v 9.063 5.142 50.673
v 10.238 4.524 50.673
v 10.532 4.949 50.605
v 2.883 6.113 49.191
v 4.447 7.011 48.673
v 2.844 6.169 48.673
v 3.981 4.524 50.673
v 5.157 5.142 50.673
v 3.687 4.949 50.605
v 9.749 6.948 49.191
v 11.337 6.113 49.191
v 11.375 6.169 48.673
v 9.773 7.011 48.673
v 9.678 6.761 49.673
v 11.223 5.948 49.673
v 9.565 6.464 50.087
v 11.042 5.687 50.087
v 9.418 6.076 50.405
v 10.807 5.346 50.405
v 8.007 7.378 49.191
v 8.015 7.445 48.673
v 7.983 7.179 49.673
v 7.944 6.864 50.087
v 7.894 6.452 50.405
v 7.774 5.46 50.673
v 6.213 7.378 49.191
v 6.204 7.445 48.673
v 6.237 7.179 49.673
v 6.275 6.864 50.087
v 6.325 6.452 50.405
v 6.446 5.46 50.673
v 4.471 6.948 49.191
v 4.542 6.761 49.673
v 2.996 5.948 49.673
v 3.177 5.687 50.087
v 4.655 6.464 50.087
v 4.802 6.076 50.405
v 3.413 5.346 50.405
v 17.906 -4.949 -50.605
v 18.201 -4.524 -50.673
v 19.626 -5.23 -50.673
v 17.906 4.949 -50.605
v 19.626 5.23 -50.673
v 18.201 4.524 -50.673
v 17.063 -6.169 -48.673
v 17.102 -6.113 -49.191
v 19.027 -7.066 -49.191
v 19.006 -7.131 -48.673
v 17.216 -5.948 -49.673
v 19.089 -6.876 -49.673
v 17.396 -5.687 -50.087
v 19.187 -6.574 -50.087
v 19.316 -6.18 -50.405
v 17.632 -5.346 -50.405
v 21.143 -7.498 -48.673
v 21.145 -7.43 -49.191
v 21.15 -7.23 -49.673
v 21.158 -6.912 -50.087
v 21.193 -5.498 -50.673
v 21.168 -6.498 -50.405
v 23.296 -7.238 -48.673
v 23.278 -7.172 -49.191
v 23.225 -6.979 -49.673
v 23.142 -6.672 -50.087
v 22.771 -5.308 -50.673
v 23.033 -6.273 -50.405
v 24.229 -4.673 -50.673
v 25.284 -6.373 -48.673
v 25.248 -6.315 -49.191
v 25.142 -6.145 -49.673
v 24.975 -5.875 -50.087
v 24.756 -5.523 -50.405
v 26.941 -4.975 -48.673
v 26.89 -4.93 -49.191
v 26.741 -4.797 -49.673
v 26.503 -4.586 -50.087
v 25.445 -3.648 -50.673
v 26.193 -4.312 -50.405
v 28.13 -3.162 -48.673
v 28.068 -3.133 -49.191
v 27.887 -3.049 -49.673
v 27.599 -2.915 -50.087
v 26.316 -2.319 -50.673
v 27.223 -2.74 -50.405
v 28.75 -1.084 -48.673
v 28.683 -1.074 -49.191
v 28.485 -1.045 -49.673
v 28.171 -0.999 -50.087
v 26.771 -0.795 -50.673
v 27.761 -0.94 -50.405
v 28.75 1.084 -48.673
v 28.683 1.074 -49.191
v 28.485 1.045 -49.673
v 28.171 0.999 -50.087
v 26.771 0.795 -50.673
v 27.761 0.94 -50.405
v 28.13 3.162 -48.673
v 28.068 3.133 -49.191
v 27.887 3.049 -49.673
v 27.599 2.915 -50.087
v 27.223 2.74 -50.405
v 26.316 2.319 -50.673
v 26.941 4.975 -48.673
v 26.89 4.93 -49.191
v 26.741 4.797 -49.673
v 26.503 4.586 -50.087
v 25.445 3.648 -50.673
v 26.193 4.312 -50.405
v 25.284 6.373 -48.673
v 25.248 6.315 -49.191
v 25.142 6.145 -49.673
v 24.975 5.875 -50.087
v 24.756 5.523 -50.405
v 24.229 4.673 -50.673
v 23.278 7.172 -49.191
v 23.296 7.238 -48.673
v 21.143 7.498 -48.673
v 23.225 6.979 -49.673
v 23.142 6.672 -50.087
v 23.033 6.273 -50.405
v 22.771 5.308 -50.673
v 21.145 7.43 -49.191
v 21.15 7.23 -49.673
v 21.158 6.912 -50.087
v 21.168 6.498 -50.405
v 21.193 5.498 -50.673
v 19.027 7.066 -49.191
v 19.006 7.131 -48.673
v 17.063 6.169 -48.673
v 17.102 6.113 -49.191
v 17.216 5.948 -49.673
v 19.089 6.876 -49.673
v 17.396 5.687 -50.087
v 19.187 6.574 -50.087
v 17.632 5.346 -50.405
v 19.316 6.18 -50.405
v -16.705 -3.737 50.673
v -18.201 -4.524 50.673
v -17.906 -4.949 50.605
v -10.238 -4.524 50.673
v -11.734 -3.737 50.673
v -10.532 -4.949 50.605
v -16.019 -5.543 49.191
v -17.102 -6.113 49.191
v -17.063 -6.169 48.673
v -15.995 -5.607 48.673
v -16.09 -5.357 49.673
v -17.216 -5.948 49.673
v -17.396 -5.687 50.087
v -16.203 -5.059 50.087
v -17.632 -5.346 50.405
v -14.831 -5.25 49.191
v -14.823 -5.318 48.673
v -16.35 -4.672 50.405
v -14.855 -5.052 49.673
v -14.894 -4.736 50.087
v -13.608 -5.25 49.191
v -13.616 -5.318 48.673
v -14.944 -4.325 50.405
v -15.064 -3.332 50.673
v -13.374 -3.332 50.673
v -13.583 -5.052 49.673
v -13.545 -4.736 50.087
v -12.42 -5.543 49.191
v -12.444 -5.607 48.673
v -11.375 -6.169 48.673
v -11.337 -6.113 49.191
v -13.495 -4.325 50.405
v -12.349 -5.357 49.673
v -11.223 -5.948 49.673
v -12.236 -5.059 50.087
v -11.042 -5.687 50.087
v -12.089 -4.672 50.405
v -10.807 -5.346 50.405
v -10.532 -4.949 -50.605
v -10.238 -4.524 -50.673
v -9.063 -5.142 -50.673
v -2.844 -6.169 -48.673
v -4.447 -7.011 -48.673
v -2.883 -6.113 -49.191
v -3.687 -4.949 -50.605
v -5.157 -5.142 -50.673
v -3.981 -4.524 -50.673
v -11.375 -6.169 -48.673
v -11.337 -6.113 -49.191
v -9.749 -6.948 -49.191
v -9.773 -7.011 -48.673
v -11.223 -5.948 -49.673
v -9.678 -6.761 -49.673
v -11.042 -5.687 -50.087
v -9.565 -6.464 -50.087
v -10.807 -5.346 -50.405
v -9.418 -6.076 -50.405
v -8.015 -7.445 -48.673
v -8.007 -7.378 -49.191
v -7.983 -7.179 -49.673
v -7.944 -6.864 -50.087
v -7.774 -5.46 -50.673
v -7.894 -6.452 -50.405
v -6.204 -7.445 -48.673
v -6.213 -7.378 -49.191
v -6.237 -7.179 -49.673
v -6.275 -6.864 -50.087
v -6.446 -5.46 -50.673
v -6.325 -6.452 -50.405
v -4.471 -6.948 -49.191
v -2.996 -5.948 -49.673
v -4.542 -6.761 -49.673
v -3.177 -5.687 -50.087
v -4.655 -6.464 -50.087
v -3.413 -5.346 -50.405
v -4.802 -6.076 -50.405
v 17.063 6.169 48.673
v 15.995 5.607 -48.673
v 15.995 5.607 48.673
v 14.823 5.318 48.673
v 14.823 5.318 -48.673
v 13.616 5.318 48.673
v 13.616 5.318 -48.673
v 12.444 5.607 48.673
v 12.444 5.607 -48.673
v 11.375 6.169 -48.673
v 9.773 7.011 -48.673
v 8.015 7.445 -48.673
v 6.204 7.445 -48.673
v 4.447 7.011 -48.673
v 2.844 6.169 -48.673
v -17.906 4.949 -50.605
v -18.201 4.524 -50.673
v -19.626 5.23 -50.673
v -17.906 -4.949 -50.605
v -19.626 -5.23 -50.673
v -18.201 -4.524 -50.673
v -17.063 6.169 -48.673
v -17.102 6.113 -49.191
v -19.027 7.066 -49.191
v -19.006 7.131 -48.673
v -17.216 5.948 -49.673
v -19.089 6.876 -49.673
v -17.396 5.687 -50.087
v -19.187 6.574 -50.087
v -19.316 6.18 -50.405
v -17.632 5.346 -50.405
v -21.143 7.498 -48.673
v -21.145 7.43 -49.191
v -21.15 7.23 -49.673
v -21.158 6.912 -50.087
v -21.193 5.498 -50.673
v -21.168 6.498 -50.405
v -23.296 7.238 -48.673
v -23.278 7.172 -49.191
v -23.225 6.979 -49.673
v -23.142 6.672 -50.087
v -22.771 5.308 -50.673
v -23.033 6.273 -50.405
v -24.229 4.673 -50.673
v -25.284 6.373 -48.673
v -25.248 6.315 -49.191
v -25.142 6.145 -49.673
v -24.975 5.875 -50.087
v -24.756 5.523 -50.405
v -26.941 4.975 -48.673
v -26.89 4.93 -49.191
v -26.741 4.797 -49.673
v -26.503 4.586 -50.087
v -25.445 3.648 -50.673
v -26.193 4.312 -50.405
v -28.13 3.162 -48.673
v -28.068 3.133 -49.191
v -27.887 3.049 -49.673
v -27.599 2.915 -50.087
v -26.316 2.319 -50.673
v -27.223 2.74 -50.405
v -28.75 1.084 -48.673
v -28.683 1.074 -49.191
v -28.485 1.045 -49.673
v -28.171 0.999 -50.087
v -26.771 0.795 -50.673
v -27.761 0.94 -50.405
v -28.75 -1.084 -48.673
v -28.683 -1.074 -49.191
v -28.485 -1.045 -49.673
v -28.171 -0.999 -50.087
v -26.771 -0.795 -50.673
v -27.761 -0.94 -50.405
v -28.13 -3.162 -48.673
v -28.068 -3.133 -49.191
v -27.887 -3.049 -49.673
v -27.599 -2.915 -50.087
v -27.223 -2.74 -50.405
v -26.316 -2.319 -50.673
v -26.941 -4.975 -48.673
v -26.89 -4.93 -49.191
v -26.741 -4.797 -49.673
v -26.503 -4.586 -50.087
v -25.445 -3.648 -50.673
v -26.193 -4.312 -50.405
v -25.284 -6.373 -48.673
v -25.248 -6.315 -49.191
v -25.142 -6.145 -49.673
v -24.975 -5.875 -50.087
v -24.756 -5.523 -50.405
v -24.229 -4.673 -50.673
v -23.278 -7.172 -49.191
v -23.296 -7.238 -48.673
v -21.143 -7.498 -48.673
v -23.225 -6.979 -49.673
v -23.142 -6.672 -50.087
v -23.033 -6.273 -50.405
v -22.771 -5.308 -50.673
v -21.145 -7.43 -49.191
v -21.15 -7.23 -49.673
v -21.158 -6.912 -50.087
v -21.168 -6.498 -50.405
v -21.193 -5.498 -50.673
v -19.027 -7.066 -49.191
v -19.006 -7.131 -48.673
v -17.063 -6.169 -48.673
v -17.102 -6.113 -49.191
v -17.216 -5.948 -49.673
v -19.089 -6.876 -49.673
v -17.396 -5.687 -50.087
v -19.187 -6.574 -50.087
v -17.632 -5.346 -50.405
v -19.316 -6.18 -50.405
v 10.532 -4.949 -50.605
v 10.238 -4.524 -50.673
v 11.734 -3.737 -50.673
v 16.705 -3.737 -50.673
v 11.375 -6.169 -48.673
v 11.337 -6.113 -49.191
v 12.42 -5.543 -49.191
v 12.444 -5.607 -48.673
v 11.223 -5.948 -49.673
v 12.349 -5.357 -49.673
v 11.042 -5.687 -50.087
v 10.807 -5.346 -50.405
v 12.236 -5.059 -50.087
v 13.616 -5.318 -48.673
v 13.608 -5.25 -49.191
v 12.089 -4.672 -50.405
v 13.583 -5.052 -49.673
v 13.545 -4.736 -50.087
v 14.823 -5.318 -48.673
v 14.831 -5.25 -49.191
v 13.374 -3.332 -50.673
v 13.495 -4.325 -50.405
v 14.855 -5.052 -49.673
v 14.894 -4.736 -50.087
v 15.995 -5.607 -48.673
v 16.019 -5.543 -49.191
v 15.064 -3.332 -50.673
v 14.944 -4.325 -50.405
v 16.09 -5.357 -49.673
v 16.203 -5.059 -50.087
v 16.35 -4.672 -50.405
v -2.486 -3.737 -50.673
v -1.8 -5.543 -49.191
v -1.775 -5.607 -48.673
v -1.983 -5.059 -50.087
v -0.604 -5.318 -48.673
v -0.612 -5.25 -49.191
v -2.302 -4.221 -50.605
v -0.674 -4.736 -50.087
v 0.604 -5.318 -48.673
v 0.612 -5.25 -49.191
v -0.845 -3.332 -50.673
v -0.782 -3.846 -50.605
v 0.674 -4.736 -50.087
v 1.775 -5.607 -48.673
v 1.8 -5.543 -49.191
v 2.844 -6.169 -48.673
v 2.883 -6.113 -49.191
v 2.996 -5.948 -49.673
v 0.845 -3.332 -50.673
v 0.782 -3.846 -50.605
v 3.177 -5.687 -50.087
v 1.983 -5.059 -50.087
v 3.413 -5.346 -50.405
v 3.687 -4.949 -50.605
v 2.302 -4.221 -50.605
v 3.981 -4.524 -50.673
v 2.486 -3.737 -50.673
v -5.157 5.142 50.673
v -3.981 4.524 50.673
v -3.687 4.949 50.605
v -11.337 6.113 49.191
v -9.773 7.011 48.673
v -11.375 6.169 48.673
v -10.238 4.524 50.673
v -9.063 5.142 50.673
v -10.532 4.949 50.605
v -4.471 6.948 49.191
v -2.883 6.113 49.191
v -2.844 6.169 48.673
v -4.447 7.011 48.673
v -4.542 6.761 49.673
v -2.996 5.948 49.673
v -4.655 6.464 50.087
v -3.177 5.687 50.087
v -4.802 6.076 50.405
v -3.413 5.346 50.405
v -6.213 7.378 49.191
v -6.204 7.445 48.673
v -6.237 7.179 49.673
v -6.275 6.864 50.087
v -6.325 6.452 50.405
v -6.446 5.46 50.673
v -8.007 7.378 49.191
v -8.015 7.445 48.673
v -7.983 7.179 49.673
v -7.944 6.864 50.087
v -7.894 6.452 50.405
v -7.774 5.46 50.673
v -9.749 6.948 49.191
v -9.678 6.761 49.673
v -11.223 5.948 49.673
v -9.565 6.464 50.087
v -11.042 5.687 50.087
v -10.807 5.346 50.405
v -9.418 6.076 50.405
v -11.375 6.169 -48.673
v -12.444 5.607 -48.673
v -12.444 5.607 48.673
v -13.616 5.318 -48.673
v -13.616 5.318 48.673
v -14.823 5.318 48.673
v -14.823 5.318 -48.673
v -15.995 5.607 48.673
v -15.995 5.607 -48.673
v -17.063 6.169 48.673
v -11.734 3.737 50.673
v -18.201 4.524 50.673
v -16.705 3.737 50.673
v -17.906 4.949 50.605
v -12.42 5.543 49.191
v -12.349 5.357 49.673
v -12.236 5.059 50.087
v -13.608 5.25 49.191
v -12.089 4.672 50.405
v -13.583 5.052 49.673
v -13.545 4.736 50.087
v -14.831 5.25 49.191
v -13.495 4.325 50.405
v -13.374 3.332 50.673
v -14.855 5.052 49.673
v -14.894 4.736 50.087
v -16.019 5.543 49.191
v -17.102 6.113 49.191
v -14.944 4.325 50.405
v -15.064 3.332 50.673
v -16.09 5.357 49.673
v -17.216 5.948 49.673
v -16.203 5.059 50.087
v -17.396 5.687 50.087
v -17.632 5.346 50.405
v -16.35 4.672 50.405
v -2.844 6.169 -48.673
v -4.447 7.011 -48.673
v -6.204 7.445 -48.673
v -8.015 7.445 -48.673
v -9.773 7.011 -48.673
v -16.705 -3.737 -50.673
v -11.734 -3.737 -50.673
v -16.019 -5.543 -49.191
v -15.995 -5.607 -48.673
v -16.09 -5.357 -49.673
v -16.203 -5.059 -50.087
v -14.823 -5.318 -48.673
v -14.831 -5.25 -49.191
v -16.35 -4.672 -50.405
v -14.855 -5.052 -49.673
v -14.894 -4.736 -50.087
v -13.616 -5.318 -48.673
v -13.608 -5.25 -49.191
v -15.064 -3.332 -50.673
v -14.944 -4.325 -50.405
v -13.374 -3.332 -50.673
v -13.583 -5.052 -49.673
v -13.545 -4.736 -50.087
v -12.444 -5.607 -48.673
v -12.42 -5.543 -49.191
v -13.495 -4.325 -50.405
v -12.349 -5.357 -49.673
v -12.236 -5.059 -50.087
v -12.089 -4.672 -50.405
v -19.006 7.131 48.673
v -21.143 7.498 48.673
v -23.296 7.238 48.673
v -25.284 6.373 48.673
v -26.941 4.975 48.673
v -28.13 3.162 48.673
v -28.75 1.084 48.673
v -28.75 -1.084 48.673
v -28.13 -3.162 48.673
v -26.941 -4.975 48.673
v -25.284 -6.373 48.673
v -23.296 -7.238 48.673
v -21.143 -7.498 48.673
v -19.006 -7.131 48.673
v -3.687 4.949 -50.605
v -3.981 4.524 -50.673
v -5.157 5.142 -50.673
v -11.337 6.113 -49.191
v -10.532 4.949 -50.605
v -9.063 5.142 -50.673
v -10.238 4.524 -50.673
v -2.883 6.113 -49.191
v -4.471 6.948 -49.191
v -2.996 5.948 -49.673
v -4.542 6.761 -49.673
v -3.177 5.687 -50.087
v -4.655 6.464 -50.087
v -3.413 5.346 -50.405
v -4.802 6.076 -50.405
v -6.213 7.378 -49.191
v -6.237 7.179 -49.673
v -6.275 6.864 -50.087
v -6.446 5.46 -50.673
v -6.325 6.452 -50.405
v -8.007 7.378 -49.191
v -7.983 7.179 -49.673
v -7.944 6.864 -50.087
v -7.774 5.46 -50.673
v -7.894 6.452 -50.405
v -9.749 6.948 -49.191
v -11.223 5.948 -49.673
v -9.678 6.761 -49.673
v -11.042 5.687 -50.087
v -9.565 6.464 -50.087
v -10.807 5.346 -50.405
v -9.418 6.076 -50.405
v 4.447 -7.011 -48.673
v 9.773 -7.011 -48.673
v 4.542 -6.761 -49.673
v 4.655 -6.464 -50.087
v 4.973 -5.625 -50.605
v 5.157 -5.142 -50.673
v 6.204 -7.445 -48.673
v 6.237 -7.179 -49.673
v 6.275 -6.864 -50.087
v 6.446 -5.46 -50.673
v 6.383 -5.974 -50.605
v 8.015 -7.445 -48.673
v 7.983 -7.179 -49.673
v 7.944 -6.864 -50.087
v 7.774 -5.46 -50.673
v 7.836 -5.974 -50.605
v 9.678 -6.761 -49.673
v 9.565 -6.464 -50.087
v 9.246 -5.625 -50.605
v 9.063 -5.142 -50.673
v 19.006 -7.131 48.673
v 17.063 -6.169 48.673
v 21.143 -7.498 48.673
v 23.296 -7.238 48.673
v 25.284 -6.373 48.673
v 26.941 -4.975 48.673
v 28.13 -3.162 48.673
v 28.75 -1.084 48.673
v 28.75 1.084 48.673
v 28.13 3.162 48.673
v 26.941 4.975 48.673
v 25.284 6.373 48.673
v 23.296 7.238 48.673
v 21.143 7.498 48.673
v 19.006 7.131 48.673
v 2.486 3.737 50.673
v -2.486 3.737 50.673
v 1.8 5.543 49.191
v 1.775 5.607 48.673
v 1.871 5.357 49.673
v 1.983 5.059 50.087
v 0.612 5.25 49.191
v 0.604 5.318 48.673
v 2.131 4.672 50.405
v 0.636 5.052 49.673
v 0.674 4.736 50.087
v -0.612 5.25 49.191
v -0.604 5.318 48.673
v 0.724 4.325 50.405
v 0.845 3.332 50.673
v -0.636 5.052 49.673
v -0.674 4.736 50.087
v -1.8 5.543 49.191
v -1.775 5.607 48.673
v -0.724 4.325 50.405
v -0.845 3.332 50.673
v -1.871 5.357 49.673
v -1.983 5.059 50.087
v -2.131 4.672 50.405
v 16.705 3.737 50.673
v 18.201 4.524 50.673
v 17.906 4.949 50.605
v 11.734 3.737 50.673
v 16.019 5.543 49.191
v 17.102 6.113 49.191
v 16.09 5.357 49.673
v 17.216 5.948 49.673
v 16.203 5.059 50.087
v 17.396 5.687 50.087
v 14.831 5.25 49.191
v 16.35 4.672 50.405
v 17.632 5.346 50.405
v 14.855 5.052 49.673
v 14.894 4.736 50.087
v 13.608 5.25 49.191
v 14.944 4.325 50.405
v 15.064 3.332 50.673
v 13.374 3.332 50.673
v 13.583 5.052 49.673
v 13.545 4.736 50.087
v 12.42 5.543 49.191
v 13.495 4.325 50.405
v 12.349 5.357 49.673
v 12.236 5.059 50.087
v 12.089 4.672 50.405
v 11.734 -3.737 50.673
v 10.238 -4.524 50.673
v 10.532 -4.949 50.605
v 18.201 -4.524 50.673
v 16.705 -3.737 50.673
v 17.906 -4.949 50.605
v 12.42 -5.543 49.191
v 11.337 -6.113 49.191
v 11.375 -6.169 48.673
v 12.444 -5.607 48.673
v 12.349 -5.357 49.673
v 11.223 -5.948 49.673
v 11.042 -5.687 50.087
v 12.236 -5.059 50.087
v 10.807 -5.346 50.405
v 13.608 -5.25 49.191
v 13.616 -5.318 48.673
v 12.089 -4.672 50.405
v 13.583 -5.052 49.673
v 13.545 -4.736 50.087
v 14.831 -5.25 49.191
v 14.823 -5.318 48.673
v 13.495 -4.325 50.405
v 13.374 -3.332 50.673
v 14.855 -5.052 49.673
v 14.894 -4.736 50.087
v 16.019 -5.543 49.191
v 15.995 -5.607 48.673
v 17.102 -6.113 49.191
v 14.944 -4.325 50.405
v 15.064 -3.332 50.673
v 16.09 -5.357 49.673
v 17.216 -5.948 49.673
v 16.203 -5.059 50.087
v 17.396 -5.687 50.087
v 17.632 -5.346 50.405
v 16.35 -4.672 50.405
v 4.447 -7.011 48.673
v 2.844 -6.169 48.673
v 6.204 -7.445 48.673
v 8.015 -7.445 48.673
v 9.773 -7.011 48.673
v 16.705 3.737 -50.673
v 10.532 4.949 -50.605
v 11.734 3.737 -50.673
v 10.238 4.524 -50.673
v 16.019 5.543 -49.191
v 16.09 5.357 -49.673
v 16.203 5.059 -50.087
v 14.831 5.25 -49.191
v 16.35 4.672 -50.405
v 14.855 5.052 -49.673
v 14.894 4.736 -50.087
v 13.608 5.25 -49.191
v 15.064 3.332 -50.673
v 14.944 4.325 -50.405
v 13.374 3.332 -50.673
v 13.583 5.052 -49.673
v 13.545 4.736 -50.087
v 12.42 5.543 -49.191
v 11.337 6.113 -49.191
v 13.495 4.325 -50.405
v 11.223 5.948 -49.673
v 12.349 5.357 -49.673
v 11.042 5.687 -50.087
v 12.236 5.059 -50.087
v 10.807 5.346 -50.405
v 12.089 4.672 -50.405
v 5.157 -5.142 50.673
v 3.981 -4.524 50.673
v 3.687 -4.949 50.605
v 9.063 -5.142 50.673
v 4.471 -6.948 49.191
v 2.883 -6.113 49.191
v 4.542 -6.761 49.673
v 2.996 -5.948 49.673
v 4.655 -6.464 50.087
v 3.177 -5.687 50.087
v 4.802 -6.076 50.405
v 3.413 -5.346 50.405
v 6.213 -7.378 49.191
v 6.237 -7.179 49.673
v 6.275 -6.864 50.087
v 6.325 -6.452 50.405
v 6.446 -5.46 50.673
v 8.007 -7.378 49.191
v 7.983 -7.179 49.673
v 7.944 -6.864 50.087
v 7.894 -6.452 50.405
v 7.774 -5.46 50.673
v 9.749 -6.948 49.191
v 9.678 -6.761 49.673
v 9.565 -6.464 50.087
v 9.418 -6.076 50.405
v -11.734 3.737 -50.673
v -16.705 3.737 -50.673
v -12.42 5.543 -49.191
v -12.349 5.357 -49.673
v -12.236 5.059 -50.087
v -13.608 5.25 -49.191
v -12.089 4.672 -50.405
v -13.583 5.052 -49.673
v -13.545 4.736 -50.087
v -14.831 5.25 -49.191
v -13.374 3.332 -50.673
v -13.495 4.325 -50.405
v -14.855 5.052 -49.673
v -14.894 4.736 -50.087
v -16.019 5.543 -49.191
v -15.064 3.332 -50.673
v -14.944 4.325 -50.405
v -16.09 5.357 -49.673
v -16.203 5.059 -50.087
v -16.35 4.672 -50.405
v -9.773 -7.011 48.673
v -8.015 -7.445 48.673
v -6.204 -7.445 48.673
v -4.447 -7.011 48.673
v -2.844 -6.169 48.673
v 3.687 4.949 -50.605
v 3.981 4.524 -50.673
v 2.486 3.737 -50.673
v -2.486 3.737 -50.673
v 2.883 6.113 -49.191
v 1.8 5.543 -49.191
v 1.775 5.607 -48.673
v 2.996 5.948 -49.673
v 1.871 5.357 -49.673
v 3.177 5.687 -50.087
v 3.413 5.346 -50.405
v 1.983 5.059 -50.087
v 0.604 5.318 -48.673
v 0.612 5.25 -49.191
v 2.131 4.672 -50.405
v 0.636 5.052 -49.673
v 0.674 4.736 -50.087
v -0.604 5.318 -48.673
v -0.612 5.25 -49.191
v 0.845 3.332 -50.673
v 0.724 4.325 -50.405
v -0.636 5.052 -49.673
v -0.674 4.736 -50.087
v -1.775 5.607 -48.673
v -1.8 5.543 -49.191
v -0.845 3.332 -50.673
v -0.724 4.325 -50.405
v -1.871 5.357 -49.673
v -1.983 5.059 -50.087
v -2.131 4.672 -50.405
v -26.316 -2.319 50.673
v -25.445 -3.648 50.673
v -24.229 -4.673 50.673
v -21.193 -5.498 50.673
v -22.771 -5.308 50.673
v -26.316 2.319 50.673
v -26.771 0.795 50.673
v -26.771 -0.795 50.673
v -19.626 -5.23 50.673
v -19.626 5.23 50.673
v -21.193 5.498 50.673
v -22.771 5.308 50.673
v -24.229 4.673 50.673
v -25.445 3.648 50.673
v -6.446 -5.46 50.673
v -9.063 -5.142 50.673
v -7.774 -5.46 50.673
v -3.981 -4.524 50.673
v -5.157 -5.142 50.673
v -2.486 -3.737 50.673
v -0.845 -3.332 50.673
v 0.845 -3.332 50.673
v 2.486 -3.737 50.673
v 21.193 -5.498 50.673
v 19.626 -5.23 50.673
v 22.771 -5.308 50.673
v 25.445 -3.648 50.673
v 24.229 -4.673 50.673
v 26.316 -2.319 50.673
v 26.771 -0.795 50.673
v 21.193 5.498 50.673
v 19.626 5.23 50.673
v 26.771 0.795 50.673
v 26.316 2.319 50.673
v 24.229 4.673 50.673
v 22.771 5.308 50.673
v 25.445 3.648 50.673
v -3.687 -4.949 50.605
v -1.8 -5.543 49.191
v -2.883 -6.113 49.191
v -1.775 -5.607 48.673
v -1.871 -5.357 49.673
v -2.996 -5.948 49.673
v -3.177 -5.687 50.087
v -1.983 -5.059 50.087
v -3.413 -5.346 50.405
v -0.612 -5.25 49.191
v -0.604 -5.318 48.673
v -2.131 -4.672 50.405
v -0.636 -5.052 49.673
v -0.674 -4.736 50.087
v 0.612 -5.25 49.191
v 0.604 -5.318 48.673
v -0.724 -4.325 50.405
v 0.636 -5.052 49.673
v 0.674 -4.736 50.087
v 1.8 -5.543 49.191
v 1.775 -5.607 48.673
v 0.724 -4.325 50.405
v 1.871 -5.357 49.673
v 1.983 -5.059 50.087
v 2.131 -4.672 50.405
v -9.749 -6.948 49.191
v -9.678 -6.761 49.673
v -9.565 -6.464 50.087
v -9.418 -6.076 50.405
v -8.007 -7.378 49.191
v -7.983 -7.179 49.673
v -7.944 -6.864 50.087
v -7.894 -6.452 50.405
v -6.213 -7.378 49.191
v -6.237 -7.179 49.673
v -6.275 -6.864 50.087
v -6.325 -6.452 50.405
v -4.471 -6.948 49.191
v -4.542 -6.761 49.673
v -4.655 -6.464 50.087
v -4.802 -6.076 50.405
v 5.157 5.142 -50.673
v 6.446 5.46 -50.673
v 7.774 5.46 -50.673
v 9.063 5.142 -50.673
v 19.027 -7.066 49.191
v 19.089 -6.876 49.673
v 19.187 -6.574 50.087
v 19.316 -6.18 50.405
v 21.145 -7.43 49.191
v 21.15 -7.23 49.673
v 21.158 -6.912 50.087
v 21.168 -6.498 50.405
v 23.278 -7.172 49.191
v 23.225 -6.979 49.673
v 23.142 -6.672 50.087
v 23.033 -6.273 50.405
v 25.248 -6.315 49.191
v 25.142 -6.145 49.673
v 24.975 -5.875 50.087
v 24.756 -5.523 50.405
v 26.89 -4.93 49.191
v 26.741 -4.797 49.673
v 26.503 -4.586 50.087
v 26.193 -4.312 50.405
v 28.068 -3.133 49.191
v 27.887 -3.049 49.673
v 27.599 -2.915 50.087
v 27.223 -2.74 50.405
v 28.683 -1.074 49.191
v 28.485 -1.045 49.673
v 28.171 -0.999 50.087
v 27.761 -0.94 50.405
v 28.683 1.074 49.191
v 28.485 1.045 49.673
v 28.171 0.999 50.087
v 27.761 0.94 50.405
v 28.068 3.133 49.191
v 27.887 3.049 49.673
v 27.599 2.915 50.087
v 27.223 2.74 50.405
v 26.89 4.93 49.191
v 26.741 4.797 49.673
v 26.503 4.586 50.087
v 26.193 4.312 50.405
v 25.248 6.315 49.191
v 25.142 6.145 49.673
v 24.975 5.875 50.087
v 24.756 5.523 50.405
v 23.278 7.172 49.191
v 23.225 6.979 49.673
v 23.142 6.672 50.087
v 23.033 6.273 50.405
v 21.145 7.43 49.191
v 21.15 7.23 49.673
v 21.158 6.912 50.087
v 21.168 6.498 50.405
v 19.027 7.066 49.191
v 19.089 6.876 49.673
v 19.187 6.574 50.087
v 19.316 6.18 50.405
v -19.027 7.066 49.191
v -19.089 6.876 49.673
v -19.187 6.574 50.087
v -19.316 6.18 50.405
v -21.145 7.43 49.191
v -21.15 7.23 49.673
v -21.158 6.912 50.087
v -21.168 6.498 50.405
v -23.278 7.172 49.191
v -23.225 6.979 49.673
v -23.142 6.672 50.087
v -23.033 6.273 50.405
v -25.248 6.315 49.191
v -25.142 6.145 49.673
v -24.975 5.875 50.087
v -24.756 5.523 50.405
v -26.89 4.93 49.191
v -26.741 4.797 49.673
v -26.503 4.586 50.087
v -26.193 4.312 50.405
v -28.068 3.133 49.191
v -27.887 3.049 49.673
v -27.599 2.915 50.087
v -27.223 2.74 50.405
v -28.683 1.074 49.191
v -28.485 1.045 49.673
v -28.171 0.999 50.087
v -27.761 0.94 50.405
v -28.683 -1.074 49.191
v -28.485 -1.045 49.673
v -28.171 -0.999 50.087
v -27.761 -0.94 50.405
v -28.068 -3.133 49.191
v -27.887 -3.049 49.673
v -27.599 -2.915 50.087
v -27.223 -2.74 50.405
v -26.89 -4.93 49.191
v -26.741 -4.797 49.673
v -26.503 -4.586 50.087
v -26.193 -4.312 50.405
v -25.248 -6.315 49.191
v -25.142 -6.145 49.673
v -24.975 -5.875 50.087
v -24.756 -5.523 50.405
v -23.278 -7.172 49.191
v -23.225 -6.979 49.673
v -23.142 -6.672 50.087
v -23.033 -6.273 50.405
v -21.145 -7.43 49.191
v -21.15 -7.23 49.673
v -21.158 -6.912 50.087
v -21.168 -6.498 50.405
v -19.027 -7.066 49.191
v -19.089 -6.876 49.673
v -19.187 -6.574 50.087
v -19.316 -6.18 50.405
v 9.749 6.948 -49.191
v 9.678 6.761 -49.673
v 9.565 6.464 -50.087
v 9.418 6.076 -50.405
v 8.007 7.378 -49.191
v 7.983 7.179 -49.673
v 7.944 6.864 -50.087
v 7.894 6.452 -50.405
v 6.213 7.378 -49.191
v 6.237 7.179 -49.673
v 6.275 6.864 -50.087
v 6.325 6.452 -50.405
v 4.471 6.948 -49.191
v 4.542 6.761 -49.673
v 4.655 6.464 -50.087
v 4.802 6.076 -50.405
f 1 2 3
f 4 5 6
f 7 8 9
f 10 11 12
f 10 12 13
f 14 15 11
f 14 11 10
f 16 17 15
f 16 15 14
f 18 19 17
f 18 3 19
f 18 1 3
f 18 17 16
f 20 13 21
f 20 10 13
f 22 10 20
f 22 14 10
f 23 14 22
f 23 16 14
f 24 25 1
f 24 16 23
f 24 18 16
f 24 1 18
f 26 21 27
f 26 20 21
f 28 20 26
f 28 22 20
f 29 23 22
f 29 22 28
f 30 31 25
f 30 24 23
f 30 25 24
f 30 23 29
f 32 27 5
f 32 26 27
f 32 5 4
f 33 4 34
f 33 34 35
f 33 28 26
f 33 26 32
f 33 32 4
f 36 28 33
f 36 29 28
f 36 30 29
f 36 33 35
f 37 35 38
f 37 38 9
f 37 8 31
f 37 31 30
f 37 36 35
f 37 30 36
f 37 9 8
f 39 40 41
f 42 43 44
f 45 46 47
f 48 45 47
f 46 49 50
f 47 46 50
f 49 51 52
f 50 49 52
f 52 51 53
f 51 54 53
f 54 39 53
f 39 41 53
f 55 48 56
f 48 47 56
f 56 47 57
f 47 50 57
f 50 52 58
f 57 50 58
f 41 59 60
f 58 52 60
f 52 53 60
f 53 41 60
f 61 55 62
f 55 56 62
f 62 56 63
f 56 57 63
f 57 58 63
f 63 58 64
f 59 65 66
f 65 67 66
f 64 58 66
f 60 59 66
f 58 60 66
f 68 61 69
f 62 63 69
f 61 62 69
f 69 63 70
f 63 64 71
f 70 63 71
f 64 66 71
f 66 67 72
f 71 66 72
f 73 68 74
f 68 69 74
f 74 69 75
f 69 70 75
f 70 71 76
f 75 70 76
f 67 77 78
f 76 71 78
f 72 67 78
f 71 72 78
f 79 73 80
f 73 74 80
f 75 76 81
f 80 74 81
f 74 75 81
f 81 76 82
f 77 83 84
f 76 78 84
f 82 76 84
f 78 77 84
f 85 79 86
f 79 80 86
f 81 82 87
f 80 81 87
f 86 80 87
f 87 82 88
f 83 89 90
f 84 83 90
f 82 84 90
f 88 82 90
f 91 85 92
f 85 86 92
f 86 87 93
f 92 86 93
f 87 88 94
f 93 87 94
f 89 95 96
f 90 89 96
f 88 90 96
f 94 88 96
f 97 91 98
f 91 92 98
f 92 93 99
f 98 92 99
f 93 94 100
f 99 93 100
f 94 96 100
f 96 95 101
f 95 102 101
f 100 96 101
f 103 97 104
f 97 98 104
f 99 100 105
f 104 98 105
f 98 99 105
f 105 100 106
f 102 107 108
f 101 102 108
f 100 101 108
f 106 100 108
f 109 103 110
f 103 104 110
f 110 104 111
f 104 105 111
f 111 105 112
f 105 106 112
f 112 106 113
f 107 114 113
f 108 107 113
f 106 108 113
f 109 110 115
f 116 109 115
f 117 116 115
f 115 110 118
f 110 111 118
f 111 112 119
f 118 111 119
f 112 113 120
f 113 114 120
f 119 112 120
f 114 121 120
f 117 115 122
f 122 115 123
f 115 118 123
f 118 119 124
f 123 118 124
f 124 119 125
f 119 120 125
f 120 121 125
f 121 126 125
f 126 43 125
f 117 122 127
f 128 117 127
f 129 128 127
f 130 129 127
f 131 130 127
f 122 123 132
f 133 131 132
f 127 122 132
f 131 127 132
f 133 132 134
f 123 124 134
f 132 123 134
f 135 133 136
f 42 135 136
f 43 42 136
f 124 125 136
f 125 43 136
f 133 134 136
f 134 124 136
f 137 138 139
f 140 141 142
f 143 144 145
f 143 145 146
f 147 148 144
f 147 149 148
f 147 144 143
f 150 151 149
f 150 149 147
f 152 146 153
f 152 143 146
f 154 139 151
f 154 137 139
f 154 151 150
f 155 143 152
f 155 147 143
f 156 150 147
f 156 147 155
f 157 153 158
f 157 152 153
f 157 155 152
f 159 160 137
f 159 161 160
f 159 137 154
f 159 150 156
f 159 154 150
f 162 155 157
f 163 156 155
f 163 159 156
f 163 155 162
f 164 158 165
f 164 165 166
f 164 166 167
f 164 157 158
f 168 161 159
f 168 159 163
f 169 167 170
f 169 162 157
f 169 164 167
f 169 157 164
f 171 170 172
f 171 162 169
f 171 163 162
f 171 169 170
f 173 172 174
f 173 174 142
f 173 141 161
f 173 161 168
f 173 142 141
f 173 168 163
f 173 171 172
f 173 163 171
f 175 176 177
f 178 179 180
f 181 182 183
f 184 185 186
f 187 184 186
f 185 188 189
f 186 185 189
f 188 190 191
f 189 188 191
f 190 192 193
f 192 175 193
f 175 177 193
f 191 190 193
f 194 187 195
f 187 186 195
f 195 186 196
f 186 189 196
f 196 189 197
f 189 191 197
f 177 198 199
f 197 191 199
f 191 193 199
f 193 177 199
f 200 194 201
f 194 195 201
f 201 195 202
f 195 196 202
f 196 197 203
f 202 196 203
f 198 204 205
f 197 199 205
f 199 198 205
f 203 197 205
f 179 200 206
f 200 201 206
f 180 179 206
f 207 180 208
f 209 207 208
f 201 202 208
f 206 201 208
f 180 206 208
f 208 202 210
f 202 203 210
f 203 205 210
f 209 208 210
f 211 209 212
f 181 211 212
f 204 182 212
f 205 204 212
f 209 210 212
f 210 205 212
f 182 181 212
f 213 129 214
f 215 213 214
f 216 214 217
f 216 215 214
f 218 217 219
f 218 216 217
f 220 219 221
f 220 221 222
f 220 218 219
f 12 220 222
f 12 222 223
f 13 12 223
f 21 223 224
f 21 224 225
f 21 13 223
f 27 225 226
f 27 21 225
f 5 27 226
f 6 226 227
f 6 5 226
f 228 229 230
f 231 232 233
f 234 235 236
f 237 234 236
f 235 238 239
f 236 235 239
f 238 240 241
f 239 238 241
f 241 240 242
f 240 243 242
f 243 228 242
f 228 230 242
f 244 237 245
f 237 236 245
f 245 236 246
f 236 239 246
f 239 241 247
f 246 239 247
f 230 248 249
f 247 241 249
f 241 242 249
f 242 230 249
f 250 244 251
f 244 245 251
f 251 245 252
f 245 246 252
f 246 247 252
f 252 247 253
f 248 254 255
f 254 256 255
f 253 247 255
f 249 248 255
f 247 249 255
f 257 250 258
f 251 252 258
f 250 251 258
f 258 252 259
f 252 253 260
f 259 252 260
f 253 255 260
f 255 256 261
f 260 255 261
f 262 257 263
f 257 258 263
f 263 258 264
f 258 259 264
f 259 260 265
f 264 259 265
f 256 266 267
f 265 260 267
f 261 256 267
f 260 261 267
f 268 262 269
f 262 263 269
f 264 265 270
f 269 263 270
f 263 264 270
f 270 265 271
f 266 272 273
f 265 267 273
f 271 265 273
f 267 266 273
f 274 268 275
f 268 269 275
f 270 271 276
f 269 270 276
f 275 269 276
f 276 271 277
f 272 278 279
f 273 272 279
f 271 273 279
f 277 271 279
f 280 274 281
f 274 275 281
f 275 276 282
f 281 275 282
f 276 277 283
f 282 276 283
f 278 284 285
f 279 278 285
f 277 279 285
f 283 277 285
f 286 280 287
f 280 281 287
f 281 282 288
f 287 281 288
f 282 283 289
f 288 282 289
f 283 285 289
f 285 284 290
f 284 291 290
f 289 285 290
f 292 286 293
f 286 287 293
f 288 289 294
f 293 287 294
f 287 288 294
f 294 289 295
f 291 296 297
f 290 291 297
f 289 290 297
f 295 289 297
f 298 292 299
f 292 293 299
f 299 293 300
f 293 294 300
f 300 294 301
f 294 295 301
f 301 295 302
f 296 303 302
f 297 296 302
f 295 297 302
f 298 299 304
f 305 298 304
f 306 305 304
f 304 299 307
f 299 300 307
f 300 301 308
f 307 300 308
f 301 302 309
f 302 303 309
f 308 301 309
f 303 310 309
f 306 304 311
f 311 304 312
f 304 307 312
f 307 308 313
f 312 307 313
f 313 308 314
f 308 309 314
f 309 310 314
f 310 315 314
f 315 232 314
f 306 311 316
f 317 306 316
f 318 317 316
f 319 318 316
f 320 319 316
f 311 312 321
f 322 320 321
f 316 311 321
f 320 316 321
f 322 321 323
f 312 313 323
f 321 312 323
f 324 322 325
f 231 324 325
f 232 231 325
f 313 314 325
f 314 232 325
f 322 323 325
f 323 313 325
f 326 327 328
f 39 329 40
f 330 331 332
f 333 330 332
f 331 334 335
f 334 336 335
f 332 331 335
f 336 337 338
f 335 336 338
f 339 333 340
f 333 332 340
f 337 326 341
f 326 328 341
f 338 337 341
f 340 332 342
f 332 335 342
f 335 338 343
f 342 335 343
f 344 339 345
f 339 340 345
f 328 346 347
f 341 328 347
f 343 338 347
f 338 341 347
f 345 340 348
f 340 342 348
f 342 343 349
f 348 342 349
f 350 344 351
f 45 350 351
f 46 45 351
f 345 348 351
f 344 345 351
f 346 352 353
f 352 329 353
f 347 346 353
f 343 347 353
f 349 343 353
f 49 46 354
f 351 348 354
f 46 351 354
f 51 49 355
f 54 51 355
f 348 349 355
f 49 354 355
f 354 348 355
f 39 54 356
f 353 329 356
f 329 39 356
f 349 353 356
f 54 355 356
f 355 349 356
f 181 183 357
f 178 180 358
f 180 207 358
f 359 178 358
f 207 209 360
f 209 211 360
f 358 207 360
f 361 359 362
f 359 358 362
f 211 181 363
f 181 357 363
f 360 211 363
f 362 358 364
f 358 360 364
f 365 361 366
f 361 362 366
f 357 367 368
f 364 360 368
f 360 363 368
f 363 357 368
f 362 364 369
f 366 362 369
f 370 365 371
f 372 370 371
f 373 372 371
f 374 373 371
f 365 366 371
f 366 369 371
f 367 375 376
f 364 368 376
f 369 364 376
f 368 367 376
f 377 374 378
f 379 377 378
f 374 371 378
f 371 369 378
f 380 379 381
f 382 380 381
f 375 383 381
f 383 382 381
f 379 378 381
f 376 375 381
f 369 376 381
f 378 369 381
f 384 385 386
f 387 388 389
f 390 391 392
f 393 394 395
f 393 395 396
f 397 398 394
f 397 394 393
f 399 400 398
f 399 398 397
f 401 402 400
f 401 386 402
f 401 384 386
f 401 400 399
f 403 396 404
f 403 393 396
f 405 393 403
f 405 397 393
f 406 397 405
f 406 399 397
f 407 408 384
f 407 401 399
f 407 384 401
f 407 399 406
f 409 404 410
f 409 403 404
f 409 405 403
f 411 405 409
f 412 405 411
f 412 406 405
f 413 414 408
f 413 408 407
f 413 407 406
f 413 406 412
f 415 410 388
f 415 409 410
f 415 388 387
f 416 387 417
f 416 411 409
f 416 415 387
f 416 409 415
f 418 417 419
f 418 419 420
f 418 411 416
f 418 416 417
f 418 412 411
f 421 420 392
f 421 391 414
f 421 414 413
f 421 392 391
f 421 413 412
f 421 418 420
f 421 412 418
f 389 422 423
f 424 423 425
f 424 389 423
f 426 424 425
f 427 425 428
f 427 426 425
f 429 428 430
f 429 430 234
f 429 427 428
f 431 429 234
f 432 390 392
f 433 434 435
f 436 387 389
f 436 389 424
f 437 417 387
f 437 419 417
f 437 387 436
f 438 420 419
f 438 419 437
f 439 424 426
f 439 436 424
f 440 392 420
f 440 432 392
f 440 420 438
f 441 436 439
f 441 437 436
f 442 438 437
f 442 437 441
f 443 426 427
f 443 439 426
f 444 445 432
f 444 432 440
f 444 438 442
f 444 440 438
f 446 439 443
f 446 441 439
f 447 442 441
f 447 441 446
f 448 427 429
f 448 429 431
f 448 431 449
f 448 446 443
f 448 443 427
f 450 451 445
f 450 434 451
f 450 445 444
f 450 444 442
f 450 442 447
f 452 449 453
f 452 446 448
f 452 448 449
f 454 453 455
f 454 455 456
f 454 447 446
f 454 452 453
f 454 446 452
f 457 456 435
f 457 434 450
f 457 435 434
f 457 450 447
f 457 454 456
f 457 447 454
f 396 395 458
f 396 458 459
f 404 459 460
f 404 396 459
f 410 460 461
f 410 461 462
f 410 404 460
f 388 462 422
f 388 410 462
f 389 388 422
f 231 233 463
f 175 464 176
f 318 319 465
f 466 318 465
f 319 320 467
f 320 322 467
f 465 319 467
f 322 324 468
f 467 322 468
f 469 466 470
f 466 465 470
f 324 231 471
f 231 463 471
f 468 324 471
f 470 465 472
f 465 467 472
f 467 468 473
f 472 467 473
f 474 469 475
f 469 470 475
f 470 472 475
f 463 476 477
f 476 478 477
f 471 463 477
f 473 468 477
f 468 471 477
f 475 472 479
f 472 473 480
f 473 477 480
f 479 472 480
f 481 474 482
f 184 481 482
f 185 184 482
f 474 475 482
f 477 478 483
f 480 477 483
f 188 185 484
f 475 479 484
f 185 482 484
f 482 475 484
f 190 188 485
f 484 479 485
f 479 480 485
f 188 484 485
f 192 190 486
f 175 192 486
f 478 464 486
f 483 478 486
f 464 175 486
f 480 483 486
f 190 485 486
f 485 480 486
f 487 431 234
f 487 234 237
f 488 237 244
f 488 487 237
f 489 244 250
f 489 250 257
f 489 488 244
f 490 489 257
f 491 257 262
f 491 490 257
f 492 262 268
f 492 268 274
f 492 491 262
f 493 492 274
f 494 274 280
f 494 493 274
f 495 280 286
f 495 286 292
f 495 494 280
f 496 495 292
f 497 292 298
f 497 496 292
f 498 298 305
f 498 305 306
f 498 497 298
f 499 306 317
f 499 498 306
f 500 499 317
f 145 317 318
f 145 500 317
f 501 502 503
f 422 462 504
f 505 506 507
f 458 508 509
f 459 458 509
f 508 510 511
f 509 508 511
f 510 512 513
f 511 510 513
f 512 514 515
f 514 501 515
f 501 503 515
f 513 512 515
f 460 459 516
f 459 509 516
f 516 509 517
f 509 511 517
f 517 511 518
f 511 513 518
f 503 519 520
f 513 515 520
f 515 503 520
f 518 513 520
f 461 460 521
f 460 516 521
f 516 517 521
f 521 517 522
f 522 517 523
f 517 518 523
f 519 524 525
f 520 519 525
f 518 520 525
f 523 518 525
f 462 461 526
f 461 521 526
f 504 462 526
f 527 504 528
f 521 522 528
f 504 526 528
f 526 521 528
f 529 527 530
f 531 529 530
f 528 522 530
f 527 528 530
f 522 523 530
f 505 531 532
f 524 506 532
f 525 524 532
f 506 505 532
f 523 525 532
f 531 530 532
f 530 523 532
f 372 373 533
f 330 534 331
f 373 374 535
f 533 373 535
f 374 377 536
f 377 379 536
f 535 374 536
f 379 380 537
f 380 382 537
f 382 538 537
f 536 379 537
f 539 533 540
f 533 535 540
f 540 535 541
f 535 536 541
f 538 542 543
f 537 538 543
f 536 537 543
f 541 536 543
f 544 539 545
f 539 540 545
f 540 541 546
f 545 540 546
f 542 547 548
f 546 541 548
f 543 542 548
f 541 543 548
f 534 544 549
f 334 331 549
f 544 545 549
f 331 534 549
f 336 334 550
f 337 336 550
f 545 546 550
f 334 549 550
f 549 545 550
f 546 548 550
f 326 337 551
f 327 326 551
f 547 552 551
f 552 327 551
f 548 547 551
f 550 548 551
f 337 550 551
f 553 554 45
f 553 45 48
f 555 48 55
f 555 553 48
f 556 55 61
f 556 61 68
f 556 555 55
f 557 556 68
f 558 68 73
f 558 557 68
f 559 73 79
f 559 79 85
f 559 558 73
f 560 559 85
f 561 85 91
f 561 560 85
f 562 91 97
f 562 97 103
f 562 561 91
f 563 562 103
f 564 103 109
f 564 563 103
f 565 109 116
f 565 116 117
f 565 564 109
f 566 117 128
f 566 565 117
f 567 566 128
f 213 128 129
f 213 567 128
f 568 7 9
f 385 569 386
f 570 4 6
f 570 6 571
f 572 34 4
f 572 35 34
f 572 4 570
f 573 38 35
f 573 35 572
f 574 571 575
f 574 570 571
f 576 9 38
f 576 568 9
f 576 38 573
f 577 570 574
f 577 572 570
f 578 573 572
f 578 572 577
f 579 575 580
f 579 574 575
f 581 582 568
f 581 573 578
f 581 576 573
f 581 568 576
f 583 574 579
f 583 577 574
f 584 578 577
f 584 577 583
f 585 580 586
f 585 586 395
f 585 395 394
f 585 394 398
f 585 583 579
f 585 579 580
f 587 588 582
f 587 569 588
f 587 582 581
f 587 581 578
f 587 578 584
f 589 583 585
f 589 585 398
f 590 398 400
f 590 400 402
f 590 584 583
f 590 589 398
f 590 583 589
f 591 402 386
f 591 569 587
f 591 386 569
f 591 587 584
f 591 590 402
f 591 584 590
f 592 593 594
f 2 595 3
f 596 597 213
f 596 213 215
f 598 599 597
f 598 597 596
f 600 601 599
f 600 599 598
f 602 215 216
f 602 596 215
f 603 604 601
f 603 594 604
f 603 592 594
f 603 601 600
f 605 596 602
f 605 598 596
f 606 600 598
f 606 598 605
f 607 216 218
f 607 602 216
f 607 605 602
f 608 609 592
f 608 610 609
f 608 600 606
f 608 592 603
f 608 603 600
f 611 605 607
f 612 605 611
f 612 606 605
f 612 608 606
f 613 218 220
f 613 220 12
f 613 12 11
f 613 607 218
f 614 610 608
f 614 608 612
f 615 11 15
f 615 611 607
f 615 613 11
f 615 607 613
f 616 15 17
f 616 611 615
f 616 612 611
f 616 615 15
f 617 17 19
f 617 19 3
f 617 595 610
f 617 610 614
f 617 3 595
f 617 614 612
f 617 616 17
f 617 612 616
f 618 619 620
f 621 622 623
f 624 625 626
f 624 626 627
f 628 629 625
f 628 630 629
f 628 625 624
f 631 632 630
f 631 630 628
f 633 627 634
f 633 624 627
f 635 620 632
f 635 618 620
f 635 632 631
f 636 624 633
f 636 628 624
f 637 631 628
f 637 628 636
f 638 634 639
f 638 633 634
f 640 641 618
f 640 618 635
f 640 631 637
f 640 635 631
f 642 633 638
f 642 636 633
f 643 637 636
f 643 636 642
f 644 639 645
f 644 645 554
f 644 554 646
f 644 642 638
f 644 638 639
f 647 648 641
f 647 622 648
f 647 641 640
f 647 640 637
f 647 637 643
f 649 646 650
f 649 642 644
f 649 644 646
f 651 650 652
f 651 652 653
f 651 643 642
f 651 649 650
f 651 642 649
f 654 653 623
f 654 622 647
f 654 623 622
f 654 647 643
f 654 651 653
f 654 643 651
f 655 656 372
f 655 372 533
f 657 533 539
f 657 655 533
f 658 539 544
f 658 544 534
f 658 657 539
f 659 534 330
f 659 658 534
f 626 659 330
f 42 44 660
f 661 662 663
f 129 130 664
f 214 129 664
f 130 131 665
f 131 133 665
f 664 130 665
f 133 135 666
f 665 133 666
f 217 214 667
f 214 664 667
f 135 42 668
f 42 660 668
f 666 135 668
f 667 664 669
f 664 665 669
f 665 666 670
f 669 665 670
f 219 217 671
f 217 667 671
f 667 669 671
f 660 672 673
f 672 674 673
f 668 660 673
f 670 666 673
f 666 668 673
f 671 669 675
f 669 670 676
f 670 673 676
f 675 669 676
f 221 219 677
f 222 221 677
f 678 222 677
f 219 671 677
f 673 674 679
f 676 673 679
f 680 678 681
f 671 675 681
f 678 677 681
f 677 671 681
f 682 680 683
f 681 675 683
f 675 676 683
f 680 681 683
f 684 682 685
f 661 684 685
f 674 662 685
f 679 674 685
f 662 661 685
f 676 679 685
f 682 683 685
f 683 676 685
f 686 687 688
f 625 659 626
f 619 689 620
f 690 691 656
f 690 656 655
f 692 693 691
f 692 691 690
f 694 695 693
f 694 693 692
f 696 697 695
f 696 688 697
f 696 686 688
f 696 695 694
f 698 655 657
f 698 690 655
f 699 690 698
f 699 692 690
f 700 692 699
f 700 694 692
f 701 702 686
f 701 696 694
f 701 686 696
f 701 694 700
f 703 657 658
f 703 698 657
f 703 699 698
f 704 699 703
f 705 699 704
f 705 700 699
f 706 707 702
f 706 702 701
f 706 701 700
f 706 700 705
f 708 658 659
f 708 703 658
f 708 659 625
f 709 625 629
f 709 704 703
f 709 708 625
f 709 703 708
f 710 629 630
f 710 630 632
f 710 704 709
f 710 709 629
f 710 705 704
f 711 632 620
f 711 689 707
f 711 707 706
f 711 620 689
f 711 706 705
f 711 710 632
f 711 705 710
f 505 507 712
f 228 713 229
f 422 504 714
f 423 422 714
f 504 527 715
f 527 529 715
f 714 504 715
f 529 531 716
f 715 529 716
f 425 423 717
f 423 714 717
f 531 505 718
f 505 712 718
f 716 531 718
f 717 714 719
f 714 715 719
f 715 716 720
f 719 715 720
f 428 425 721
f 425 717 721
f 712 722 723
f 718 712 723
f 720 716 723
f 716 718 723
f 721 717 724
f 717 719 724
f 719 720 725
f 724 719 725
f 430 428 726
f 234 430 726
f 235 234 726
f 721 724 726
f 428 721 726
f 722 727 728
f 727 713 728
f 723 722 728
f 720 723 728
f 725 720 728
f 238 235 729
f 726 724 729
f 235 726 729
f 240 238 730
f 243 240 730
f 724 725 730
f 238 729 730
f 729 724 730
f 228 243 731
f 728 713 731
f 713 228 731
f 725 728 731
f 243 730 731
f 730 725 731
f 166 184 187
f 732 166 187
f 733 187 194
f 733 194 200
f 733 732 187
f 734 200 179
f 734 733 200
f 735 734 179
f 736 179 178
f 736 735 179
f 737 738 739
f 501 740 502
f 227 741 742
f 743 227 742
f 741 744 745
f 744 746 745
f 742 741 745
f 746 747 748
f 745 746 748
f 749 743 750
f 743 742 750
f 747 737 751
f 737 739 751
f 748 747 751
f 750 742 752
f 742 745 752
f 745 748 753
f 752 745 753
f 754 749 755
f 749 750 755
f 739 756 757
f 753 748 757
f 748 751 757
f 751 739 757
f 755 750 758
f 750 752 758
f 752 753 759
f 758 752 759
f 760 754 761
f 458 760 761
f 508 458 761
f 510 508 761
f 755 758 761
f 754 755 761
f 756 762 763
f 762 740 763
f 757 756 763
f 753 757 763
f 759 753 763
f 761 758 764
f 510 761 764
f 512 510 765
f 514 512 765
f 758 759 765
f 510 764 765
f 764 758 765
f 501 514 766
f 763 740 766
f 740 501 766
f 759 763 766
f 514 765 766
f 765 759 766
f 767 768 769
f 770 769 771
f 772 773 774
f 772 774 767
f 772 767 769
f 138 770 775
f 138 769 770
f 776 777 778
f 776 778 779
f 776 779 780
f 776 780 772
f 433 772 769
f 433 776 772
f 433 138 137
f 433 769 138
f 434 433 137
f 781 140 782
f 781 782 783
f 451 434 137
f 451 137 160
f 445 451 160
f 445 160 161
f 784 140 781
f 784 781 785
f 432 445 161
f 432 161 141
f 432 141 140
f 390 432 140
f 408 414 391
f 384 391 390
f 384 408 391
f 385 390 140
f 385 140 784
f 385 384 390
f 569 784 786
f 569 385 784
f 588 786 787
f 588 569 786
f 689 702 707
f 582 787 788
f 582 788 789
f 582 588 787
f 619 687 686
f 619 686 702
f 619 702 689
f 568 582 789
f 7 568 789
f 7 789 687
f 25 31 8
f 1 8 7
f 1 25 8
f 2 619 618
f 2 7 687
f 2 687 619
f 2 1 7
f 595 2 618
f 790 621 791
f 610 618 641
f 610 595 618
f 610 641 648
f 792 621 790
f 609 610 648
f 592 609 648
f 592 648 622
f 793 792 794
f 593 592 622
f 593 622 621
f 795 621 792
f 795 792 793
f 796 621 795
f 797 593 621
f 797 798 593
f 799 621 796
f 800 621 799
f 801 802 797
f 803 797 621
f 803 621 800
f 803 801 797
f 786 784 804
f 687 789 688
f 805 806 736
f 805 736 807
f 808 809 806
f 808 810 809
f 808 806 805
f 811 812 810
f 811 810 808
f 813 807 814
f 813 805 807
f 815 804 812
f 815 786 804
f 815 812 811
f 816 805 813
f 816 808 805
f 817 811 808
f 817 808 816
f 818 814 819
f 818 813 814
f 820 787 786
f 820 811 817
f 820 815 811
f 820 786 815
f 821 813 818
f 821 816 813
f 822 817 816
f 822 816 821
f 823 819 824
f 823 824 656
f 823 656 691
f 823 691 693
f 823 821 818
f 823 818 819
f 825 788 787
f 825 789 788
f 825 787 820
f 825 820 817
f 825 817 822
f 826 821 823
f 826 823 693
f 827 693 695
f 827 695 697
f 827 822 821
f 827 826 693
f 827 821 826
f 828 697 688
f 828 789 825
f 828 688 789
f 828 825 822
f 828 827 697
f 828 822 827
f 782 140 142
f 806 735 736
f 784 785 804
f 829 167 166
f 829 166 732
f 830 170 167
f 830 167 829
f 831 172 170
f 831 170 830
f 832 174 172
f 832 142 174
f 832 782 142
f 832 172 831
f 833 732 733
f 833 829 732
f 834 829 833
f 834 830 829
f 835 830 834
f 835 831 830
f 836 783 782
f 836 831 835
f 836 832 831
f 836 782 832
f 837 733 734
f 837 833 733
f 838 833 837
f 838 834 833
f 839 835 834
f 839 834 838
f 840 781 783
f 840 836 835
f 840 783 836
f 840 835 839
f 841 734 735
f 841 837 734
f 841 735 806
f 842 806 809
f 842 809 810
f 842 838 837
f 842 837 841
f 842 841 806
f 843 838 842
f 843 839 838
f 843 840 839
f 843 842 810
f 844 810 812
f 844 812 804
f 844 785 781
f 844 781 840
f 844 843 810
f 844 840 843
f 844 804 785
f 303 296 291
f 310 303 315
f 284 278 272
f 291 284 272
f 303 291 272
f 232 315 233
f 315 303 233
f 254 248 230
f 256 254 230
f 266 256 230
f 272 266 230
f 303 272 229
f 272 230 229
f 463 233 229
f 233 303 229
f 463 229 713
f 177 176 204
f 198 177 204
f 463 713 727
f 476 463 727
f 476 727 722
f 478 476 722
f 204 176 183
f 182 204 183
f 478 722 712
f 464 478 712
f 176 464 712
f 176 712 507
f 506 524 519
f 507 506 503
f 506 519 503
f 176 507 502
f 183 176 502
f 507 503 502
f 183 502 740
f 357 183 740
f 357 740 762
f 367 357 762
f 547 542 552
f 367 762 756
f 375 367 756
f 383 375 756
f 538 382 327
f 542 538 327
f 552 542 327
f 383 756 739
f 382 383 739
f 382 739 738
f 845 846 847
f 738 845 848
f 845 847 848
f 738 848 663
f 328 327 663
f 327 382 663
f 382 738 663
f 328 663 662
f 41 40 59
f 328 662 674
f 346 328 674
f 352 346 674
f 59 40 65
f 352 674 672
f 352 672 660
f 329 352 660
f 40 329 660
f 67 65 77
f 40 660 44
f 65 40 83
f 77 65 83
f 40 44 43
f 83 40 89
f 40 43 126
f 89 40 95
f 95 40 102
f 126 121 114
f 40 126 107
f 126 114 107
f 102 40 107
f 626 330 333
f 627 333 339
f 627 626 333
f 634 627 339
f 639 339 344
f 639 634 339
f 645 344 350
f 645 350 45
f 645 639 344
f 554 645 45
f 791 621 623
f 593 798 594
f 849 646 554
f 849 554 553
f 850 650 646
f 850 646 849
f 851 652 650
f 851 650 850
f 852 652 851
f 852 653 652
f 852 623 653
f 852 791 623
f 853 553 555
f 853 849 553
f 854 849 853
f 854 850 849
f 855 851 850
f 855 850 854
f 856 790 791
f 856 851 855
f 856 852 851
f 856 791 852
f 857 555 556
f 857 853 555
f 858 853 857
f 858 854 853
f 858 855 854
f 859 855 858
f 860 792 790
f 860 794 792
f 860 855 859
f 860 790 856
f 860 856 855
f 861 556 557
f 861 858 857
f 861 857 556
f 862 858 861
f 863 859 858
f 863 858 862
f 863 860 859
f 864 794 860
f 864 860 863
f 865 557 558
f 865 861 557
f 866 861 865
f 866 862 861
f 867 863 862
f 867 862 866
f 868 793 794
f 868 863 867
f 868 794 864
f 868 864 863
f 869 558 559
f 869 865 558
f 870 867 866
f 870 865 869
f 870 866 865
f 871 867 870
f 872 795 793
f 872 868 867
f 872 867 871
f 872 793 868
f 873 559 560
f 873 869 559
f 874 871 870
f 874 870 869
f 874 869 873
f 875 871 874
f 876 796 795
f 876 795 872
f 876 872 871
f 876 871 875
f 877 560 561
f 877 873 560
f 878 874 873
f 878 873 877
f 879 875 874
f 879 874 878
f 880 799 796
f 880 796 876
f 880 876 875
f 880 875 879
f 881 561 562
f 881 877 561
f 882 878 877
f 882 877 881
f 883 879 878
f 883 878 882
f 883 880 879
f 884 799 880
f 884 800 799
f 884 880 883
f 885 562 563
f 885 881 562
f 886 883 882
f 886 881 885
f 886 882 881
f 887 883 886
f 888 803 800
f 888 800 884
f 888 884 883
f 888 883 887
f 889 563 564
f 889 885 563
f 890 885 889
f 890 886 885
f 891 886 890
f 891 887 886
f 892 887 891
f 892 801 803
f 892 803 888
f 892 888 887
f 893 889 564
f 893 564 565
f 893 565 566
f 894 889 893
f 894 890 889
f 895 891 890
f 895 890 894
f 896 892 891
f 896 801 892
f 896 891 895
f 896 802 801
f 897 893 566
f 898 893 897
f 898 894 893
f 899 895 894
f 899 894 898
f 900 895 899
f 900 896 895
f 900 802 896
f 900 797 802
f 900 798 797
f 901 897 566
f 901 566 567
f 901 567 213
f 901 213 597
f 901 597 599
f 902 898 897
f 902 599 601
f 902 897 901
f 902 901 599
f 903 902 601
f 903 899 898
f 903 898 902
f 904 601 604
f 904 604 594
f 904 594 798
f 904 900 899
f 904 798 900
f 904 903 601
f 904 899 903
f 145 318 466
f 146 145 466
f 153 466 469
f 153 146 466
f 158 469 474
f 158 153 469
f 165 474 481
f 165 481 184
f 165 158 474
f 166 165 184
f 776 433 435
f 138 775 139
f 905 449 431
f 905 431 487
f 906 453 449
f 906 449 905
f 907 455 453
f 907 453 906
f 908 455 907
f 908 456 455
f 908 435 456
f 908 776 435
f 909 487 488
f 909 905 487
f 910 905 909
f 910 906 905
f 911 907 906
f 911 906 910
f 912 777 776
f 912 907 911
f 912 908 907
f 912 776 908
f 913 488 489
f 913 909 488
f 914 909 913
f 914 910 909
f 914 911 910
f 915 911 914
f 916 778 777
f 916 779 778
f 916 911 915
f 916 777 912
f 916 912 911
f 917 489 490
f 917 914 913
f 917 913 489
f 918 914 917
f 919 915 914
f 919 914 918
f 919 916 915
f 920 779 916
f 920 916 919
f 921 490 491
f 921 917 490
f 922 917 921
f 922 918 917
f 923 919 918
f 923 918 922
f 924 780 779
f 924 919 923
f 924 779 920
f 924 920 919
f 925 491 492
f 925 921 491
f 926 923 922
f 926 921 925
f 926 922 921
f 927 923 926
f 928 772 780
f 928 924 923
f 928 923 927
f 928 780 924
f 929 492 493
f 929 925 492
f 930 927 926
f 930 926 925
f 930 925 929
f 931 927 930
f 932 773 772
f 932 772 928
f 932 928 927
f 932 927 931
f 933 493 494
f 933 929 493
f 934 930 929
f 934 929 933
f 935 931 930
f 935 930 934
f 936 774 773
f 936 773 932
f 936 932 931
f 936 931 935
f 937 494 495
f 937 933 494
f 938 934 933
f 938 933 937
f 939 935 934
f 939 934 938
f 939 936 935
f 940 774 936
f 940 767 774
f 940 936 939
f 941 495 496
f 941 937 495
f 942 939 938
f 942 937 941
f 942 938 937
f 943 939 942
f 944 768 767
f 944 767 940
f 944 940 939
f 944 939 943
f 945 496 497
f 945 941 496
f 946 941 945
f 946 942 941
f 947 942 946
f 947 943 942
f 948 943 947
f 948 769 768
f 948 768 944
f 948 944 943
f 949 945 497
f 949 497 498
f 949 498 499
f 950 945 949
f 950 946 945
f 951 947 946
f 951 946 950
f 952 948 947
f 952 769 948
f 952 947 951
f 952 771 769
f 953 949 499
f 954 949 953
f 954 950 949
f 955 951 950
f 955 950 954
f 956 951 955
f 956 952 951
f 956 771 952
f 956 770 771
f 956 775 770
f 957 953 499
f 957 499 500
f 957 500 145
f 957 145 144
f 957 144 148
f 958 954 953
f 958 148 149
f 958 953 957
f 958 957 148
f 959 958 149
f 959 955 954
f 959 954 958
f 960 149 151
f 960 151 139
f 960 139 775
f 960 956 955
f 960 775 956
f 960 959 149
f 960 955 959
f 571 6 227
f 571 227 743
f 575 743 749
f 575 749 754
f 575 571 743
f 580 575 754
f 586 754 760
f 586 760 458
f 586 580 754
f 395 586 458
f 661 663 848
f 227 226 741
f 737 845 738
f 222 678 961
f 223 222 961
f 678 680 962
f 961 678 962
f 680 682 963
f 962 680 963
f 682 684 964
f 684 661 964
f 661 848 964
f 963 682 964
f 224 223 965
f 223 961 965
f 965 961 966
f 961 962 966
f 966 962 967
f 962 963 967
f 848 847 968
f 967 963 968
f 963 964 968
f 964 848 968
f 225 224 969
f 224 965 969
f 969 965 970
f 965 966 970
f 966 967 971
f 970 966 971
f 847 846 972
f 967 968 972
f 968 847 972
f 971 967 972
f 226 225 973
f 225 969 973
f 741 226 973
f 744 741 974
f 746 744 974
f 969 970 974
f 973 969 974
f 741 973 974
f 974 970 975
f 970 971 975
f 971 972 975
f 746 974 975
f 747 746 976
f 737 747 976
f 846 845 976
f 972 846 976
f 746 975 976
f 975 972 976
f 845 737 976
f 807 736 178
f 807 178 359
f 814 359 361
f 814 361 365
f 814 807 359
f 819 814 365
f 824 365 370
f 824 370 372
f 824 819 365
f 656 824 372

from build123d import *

# Parameters (mm, degrees)
BOSS_EXTRUDE1_DEPTH = 50.673
FILLET1_R           = 2


with BuildPart() as part:
    # Sketch1 → Boss-Extrude1 (new body, symmetric)
    with BuildSketch(Plane.XY):
        with BuildLine():
            ThreePointArc((-17.0632, 6.168707349), (-28.829, 0), (-17.0632, -6.168707349))
            ThreePointArc((-17.0632, -6.168707349), (-14.219333333, -5.281178915), (-11.375466667, -6.168707349))
            ThreePointArc((-11.375466667, -6.168707349), (-7.109666667, -7.5), (-2.843866667, -6.168707349))
            ThreePointArc((-2.843866667, -6.168707349), (0, -5.281178915), (2.843866667, -6.168707349))
            ThreePointArc((2.843866667, -6.168707349), (7.109666667, -7.5), (11.375466667, -6.168707349))
            ThreePointArc((11.375466667, -6.168707349), (14.219333333, -5.281178915), (17.0632, -6.168707349))
            ThreePointArc((17.0632, -6.168707349), (28.829, 0), (17.0632, 6.168707349))
            ThreePointArc((17.0632, 6.168707349), (14.219333333, 5.281178915), (11.375466667, 6.168707349))
            ThreePointArc((11.375466667, 6.168707349), (7.109666667, 7.5), (2.843866667, 6.168707349))
            ThreePointArc((2.843866667, 6.168707349), (0, 5.281178915), (-2.843866667, 6.168707349))
            ThreePointArc((-2.843866667, 6.168707349), (-7.109666667, 7.5), (-11.375466667, 6.168707349))
            ThreePointArc((-11.375466667, 6.168707349), (-14.219333333, 5.281178915), (-17.0632, 6.168707349))
        make_face()
    extrude(amount=BOSS_EXTRUDE1_DEPTH, both=True)

    # Fillet1
    fillet1_edges = [part.edges().sort_by_distance(p)[0] for p in [
        (7.109666667, -7.5, -50.673),
        (0, -5.281178915, -50.673),
        (14.219333333, 5.281178915, 50.673),
        (-7.109666667, -7.5, -50.673),
        (-14.219333333, -5.281178915, -50.673),
        (-28.829, 0, -50.673),
        (-14.219333333, 5.281178915, -50.673),
        (-7.109666667, 7.5, -50.673),
        (0, 5.281178915, -50.673),
        (7.109666667, 7.5, -50.673),
        (14.219333333, 5.281178915, -50.673),
        (28.829, 0, -50.673),
        (14.219333333, -5.281178915, -50.673),
        (7.109666667, 7.5, 50.673),
        (0, 5.281178915, 50.673),
        (-7.109666667, 7.5, 50.673),
        (-14.219333333, 5.281178915, 50.673),
        (-28.829, 0, 50.673),
        (-14.219333333, -5.281178915, 50.673),
        (-7.109666667, -7.5, 50.673),
        (0, -5.281178915, 50.673),
        (7.109666667, -7.5, 50.673),
        (14.219333333, -5.281178915, 50.673),
        (28.829, 0, 50.673),
    ]]
    fillet(fillet1_edges, radius=FILLET1_R)


solid = part.part
